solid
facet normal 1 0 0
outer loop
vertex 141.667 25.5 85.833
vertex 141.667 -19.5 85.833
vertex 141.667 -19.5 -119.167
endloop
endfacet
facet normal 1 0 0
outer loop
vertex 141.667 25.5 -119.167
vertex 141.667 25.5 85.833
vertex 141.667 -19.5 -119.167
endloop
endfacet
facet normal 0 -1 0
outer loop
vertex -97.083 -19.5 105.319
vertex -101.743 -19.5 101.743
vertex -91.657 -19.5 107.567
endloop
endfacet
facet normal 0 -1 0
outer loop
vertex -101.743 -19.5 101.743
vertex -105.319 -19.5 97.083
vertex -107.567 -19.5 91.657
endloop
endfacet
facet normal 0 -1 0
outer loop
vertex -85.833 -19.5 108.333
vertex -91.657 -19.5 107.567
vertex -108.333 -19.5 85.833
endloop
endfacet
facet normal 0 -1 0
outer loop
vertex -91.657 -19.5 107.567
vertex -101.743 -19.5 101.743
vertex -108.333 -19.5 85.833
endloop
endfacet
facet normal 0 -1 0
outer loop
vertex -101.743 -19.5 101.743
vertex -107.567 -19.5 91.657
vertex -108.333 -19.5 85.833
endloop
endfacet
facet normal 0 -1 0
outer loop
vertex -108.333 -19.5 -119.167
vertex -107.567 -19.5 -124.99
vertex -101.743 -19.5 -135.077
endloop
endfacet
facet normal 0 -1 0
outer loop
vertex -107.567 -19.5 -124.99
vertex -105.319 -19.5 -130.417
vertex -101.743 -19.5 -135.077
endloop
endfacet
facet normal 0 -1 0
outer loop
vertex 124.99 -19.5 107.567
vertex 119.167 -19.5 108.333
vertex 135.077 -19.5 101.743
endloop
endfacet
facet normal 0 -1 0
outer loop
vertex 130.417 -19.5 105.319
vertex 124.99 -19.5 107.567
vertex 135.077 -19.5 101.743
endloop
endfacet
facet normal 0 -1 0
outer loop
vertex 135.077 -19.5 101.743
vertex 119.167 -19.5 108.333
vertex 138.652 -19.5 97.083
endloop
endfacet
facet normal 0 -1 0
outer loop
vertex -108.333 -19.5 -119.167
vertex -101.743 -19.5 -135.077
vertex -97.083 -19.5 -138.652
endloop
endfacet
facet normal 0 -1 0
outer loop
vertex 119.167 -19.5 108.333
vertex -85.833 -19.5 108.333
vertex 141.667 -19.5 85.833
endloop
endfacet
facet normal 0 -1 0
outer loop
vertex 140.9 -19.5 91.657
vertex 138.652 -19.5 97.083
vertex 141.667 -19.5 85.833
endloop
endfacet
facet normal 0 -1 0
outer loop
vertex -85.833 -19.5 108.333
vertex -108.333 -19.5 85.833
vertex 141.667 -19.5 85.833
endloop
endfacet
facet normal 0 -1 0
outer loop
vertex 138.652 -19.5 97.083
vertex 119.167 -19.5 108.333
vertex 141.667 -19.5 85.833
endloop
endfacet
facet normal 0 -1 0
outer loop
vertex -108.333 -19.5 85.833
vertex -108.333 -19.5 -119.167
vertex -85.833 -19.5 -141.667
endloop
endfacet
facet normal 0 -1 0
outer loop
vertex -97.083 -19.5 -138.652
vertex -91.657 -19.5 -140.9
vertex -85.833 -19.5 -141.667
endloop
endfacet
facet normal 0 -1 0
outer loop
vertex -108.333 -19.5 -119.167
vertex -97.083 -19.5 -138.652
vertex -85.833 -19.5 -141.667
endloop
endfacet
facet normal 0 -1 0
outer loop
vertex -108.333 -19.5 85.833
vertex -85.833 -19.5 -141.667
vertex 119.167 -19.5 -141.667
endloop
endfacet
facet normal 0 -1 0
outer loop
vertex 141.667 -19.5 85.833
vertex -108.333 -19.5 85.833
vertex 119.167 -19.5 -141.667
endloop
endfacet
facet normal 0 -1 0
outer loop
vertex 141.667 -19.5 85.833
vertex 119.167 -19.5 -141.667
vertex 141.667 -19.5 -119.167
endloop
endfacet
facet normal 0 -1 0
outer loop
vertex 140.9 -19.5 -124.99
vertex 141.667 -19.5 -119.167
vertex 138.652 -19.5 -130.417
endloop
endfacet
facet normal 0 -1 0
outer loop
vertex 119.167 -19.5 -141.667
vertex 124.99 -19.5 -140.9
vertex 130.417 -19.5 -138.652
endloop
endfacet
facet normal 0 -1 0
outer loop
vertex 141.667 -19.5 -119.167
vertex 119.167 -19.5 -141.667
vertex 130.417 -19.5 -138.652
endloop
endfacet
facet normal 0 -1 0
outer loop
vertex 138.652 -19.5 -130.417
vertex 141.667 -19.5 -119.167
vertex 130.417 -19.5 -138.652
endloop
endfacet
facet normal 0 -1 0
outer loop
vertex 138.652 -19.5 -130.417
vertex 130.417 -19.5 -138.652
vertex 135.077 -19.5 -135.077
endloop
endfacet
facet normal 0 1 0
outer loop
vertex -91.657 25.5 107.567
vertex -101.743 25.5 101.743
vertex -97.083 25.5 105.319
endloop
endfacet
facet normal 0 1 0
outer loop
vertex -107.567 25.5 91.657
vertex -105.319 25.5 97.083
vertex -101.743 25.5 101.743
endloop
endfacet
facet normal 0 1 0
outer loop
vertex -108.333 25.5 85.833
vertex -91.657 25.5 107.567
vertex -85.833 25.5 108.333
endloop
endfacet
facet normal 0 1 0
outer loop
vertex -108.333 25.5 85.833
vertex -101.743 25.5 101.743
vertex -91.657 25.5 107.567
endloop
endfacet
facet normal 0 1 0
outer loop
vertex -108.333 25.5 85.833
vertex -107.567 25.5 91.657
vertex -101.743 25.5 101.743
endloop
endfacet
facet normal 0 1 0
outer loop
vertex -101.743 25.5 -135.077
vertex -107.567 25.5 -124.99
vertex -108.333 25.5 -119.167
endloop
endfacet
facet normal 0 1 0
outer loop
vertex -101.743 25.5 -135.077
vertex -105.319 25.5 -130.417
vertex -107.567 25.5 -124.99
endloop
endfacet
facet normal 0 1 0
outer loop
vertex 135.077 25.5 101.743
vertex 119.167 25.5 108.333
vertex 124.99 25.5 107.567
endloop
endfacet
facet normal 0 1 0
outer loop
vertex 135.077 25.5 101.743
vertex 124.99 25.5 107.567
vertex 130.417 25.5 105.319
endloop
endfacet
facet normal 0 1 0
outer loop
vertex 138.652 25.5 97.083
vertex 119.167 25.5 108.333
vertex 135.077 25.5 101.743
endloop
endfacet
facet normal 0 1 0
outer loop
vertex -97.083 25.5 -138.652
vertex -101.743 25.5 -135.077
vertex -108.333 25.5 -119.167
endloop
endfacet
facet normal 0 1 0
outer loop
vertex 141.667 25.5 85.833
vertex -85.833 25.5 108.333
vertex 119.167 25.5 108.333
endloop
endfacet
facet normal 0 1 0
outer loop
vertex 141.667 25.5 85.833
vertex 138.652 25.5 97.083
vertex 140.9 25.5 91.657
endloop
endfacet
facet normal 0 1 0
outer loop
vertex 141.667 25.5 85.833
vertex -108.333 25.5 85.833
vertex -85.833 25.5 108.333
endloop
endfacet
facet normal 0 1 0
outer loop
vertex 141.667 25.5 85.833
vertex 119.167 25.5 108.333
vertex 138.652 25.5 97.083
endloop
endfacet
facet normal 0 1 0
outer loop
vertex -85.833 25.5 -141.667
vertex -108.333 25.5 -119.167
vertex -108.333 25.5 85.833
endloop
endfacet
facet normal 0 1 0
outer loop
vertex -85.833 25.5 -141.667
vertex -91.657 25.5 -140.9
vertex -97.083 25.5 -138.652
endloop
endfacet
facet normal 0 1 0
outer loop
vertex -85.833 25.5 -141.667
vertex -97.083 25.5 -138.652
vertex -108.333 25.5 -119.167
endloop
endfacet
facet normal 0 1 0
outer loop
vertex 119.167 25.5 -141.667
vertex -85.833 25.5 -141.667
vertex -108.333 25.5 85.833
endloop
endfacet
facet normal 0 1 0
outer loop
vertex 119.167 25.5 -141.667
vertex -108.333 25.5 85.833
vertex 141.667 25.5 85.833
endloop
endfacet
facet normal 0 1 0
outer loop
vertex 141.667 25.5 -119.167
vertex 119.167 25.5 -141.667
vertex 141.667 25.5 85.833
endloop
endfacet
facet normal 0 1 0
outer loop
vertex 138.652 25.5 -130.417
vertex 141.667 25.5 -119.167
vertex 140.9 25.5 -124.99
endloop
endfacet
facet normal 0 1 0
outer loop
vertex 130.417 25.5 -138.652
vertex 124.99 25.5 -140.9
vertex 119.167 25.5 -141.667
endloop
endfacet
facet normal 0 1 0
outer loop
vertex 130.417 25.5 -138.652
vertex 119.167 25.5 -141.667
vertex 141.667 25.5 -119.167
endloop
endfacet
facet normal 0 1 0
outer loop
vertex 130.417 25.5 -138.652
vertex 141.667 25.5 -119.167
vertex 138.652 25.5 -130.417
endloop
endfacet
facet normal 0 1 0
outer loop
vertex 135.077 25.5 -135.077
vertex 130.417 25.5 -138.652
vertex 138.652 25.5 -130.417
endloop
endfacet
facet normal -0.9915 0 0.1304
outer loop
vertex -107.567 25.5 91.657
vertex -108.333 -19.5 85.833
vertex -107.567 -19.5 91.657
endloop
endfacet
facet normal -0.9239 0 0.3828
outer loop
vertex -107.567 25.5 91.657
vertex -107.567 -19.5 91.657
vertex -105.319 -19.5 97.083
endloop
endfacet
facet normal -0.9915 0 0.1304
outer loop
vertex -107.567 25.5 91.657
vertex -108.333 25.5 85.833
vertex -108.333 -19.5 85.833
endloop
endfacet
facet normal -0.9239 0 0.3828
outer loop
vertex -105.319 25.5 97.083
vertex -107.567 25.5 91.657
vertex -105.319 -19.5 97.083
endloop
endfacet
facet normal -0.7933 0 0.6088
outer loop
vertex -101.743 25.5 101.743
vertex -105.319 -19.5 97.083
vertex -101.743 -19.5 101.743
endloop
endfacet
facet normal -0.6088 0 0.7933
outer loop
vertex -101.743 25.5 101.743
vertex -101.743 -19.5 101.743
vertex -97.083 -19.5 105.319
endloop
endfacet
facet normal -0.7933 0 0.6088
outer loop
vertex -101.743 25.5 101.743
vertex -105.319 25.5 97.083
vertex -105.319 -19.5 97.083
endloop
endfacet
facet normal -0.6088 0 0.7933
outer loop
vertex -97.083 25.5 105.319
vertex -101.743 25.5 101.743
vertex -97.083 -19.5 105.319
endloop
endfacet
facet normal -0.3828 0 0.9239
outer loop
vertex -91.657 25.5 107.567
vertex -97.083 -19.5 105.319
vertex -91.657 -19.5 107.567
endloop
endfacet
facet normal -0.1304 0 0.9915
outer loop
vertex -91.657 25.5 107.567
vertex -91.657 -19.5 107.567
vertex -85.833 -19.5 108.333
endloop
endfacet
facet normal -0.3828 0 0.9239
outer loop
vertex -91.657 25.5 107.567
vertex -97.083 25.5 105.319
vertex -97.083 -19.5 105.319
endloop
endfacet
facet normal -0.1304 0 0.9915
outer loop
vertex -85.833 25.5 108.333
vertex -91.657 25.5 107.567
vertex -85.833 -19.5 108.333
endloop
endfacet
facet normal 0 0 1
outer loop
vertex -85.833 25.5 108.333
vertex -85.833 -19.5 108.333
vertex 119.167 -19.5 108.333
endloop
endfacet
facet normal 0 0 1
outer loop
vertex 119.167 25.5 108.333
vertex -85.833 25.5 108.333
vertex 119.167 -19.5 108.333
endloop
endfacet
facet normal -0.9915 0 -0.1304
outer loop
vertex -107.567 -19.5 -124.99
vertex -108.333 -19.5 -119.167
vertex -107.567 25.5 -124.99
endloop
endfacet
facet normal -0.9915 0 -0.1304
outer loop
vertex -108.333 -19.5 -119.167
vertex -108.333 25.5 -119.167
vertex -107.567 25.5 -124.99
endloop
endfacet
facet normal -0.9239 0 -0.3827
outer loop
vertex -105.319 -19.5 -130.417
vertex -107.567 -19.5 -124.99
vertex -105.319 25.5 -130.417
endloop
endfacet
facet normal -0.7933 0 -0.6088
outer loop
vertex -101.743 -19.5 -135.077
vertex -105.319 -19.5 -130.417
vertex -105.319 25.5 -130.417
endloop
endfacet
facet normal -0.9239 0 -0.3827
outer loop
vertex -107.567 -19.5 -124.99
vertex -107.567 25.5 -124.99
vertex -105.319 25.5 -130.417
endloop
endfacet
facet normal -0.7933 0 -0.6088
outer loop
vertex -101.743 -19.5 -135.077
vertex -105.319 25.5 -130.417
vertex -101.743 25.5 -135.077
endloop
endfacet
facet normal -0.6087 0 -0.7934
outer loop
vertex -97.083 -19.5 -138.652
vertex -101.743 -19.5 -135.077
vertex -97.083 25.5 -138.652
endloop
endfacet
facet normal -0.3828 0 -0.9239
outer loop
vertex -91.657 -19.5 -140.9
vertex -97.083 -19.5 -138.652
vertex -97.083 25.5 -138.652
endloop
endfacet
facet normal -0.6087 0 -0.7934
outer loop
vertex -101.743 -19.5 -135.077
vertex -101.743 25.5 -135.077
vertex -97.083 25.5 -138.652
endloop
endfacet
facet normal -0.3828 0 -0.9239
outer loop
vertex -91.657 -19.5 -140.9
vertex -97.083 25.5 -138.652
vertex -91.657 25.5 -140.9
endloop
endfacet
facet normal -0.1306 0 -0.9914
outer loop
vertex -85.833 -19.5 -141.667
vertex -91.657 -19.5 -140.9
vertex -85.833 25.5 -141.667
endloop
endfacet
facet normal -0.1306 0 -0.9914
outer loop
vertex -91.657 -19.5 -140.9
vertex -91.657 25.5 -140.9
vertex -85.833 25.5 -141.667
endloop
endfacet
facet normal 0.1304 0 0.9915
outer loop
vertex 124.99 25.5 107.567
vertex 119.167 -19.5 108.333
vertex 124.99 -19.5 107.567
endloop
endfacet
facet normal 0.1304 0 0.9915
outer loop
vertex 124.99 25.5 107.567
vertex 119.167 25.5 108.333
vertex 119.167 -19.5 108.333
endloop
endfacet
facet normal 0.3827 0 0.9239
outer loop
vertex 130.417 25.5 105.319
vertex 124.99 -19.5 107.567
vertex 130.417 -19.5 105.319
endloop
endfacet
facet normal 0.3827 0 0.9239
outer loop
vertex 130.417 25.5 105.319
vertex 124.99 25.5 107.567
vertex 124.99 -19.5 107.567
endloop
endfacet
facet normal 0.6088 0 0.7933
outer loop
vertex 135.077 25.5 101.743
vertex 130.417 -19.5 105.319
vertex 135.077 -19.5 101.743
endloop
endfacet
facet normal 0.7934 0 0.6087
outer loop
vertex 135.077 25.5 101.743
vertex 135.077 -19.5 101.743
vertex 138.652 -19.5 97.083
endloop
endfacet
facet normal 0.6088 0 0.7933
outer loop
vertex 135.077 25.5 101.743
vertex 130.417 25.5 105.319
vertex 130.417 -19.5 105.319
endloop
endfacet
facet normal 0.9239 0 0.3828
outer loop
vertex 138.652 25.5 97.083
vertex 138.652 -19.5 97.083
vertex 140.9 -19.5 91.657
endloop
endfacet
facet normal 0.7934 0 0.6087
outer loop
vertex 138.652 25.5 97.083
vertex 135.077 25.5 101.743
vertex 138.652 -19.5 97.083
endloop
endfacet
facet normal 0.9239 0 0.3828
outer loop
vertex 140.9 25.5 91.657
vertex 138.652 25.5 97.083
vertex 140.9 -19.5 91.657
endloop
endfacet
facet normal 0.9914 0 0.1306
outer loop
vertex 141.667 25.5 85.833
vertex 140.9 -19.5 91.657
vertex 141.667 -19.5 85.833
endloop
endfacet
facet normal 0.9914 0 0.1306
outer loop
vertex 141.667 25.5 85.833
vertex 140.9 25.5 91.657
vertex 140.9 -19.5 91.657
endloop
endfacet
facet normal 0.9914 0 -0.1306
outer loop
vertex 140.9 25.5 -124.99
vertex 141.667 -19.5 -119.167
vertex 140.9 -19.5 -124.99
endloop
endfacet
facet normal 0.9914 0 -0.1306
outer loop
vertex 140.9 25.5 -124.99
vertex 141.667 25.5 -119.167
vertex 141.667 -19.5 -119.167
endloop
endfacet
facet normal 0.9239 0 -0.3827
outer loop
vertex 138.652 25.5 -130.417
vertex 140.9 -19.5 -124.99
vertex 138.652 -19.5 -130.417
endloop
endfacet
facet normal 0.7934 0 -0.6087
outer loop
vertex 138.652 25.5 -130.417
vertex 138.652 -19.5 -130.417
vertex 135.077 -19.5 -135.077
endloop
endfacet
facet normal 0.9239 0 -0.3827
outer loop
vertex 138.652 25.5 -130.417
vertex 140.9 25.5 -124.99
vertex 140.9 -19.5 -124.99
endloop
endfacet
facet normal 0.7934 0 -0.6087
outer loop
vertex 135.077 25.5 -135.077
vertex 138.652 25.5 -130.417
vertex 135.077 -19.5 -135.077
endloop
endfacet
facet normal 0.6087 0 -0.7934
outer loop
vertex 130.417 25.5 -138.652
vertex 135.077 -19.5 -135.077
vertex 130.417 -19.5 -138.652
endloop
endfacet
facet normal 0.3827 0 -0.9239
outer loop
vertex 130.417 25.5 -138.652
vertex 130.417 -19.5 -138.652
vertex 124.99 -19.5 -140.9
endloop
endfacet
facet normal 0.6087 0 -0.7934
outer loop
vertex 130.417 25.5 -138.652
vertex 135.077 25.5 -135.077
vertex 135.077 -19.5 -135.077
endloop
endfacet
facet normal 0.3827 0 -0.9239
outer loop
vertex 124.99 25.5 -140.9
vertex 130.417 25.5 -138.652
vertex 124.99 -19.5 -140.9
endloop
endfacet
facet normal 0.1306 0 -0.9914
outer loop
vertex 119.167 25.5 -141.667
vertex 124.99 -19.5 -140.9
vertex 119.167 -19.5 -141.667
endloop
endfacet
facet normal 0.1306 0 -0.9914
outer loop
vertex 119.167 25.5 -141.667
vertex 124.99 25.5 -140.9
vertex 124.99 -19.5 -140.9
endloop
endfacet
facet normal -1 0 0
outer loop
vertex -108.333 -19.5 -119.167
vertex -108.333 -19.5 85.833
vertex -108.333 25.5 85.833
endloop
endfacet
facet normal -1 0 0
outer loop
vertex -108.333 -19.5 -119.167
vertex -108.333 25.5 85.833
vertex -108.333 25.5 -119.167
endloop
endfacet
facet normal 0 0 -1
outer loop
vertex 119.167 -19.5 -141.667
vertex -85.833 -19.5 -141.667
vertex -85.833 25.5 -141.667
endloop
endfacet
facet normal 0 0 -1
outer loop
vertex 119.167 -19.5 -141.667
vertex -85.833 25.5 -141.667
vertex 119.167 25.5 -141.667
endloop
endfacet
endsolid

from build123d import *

# Parameters (mm, degrees)
SKETCH2_W           = 33.333333333
SKETCH2_H           = 33.333333333
BOSS_EXTRUDE1_DEPTH = 6
FILLET1_R           = 3
SCALE1_SCALE        = 7.5


with BuildPart() as part:
    # Sketch2 → Boss-Extrude1 (new body)
    with BuildSketch(Plane(origin=(0, 0, 0), x_dir=(1, 0, 0), z_dir=(0, 1, 0))):
        with Locations((16.666666666, 16.666666666)):
            Rectangle(SKETCH2_W, SKETCH2_H)
    extrude(amount=BOSS_EXTRUDE1_DEPTH)

    # Fillet1
    fillet1_edges = [part.edges().sort_by_distance(p)[0] for p in [
        (0, 3, -33.333333333),
        (33.333333333, 3, -33.333333333),
        (33.333333333, 3, 0),
        (0, 3, 0),
    ]]
    fillet(fillet1_edges, radius=FILLET1_R)


with BuildPart() as part_1:
    # Scale1: scaled about (16.666666667, 3, -16.666666667)
    add(part.part.scale(SCALE1_SCALE).moved(Location((-108.333333336, -19.5, 108.333333336))))


solid = part_1.part
